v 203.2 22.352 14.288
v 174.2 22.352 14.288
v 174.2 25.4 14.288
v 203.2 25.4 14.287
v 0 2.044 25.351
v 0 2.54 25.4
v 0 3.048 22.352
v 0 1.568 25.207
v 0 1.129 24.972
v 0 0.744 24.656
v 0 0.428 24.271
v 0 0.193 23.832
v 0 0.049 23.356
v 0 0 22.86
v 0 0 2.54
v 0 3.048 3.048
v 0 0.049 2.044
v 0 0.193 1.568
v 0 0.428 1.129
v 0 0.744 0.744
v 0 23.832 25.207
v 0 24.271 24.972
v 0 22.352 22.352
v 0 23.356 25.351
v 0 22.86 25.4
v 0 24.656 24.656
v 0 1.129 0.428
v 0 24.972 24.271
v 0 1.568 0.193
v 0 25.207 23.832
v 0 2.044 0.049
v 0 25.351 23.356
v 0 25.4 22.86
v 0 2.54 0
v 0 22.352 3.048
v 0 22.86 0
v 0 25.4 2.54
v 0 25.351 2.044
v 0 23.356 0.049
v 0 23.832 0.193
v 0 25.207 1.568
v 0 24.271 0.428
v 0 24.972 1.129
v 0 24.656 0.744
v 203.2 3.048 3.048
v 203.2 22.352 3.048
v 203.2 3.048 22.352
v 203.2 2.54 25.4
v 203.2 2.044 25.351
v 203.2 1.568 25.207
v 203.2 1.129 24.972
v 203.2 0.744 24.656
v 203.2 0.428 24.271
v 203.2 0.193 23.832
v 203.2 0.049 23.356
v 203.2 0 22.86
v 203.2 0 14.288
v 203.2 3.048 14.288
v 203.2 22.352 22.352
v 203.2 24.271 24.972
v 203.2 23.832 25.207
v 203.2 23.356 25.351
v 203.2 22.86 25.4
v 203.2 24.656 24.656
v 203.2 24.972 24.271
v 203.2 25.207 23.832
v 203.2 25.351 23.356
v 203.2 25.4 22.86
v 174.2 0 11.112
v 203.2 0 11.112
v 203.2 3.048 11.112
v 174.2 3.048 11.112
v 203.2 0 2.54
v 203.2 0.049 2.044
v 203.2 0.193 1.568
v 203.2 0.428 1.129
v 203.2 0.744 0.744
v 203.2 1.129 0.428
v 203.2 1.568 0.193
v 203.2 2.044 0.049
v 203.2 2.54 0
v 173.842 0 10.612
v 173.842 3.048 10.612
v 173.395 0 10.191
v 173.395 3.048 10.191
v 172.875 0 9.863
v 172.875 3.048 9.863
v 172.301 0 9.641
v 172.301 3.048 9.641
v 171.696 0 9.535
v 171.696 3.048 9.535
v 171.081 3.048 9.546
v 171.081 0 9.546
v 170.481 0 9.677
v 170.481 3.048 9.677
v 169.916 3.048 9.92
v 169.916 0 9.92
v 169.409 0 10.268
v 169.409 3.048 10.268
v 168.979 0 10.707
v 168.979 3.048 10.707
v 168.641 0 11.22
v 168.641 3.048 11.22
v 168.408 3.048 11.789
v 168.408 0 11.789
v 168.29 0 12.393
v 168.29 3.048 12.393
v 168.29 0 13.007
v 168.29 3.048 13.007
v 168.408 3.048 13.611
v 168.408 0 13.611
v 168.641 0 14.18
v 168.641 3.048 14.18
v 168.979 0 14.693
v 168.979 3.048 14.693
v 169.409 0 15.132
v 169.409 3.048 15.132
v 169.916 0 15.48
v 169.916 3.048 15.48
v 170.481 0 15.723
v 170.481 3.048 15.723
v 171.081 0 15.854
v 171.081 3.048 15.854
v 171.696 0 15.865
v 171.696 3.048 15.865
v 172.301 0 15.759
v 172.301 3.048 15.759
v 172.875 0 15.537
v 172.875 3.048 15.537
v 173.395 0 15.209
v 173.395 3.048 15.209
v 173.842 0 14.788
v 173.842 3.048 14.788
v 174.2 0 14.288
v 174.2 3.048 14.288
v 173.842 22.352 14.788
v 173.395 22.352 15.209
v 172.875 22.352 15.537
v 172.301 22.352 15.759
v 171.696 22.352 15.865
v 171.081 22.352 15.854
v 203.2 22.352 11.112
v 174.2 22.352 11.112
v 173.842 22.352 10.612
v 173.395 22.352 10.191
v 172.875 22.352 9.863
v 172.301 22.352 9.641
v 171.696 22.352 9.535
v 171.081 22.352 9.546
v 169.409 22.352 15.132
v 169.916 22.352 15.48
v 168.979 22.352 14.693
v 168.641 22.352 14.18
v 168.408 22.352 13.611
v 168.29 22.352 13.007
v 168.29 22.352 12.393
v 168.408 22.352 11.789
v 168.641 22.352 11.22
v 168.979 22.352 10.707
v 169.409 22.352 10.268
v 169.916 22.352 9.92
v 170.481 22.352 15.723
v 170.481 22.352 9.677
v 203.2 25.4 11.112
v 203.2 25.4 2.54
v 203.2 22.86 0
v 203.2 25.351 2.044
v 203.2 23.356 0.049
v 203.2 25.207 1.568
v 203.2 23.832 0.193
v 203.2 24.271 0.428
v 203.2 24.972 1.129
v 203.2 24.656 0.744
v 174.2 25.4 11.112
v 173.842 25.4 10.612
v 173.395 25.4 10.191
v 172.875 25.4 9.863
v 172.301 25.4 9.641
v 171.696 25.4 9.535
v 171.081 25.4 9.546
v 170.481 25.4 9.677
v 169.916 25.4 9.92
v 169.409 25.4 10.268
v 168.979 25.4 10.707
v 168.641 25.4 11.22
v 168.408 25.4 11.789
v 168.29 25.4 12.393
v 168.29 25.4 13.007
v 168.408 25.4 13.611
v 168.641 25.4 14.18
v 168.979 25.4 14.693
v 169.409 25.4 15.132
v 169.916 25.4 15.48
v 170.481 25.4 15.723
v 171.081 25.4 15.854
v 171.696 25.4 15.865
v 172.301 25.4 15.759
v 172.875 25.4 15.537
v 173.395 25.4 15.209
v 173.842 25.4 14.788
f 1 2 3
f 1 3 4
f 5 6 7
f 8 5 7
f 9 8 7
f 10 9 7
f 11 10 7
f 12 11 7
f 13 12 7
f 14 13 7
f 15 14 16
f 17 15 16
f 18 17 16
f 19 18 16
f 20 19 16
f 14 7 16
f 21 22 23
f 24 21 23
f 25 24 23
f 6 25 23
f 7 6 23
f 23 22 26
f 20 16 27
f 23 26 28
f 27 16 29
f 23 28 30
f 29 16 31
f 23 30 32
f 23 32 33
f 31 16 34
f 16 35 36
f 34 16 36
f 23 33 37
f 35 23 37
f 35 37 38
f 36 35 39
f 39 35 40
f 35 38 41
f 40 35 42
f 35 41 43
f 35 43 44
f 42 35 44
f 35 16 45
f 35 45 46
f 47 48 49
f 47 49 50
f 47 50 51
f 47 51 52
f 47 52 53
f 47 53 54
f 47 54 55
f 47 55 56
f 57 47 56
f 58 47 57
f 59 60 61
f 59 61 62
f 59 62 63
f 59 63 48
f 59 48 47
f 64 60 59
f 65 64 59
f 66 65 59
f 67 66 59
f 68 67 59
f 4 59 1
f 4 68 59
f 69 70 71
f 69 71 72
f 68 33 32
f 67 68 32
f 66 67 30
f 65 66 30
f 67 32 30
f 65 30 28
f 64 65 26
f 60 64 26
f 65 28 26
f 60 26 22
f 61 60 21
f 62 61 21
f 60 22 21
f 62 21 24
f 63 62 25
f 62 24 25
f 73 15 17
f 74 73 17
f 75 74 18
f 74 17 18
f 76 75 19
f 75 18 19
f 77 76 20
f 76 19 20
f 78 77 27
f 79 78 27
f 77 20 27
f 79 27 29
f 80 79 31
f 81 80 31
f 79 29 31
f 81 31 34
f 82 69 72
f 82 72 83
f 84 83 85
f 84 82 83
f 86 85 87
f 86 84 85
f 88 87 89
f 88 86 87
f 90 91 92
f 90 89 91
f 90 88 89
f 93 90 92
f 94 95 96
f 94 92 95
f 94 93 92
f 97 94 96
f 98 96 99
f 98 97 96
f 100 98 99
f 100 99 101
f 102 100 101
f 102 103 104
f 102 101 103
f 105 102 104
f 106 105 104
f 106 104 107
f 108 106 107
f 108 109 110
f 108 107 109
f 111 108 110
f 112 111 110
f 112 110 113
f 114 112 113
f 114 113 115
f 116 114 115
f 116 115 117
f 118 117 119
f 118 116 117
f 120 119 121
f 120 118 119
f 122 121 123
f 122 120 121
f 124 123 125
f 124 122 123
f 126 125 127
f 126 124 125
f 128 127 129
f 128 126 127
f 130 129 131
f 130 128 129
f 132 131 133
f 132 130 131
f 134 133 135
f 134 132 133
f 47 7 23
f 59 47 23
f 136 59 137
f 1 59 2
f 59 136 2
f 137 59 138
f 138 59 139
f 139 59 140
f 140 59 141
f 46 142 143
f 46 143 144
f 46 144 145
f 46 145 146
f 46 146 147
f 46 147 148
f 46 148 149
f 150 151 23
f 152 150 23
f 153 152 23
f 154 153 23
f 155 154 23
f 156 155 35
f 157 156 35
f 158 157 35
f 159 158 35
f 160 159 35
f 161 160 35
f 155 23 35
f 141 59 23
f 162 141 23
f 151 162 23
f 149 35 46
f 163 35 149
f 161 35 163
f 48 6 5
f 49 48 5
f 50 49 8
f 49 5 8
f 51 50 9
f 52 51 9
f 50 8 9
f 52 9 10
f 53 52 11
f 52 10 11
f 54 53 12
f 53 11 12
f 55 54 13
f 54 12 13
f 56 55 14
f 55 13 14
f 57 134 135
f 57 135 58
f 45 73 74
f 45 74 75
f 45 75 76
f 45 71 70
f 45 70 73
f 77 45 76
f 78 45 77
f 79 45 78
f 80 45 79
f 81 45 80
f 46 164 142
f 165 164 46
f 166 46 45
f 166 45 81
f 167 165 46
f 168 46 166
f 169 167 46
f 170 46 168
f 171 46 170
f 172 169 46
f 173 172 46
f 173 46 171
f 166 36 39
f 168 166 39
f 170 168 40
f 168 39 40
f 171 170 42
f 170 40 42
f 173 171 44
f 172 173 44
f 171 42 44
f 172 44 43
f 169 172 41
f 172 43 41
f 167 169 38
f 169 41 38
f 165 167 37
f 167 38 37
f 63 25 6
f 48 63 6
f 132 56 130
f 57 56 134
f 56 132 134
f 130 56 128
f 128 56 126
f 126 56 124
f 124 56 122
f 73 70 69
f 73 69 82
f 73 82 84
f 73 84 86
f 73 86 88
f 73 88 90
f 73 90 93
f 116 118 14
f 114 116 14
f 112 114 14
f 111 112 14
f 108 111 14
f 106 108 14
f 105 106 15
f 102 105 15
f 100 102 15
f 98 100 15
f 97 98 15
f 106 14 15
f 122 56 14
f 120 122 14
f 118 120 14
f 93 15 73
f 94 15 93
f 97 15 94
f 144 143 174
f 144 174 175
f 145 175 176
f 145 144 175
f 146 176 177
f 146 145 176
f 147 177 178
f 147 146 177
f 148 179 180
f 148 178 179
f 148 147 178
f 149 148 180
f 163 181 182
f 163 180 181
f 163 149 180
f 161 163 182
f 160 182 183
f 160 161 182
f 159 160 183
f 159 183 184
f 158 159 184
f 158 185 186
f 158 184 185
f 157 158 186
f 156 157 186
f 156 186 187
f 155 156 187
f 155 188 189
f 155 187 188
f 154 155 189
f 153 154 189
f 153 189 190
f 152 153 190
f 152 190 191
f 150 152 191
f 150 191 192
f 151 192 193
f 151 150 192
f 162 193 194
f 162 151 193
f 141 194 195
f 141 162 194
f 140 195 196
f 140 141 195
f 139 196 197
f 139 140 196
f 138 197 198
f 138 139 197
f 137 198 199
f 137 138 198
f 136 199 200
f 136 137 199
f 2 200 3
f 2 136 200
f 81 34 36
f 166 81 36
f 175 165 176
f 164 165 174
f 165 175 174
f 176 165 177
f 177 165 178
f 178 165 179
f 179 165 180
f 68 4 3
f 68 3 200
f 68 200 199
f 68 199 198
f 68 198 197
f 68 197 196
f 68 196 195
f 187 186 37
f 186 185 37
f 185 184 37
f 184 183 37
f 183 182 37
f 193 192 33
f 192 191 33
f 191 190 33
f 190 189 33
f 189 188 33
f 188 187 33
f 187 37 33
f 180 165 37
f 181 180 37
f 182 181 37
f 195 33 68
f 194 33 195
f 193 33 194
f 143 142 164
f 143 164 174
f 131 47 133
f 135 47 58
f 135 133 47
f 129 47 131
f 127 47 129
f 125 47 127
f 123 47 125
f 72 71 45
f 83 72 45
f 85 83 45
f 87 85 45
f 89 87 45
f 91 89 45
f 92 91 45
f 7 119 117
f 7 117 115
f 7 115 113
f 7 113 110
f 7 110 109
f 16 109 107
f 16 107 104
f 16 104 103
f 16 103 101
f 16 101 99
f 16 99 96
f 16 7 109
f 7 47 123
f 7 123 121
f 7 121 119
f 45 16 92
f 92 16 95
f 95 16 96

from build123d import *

# Parameters (mm, degrees)
SKETCH1_W               = 19.304
SKETCH1_H               = 19.304
BOSS_EXTRUDE1_DEPTH     = 203.2
CUT_EXTRUDE1_DEPTH      = 207.350575478
CUT_EXTRUDE1_DEPTH_BACK = 207.350575478


with BuildPart() as part:
    # Sketch1 → Boss-Extrude1 (new body)
    with BuildSketch(Plane(origin=(0, 0, 0), x_dir=(0, 0, -1), z_dir=(1, 0, 0))):
        with BuildLine():
            Line((0, 2.54), (0, 22.86))
            ThreePointArc((0, 22.86), (-0.743948776, 24.656051224), (-2.54, 25.4))
            Line((-2.54, 25.4), (-22.86, 25.4))
            ThreePointArc((-22.86, 25.4), (-24.656051224, 24.656051224), (-25.4, 22.86))
            Line((-25.4, 22.86), (-25.4, 2.54))
            ThreePointArc((-25.4, 2.54), (-24.656051224, 0.743948776), (-22.86, 0))
            Line((-22.86, 0), (-2.54, 0))
            ThreePointArc((-2.54, 0), (-0.743948776, 0.743948776), (0, 2.54))
        make_face()
        with Locations((-12.7, 12.7)):
            Rectangle(SKETCH1_W, SKETCH1_H, mode=Mode.SUBTRACT)
    extrude(amount=BOSS_EXTRUDE1_DEPTH)

    # Sketch2 → Cut-Extrude1 (cut, two sides: drawn at the far end of the back side and taken through both)
    with BuildSketch(Plane(origin=(0, 25.4, 0), x_dir=(1, 0, 0), z_dir=(0, 1, 0)).offset(-CUT_EXTRUDE1_DEPTH_BACK)):
        with BuildLine():
            Line((203.2, -11.1125), (174.199630657, -11.1125))
            ThreePointArc((174.199630657, -11.1125), (168.275, -12.7), (174.199630657, -14.2875))
            Line((174.199630657, -14.2875), (203.2, -14.2875))
            Line((203.2, -14.2875), (203.2, -11.1125))
        make_face()
    extrude(amount=CUT_EXTRUDE1_DEPTH + CUT_EXTRUDE1_DEPTH_BACK, mode=Mode.SUBTRACT)


solid = part.part
